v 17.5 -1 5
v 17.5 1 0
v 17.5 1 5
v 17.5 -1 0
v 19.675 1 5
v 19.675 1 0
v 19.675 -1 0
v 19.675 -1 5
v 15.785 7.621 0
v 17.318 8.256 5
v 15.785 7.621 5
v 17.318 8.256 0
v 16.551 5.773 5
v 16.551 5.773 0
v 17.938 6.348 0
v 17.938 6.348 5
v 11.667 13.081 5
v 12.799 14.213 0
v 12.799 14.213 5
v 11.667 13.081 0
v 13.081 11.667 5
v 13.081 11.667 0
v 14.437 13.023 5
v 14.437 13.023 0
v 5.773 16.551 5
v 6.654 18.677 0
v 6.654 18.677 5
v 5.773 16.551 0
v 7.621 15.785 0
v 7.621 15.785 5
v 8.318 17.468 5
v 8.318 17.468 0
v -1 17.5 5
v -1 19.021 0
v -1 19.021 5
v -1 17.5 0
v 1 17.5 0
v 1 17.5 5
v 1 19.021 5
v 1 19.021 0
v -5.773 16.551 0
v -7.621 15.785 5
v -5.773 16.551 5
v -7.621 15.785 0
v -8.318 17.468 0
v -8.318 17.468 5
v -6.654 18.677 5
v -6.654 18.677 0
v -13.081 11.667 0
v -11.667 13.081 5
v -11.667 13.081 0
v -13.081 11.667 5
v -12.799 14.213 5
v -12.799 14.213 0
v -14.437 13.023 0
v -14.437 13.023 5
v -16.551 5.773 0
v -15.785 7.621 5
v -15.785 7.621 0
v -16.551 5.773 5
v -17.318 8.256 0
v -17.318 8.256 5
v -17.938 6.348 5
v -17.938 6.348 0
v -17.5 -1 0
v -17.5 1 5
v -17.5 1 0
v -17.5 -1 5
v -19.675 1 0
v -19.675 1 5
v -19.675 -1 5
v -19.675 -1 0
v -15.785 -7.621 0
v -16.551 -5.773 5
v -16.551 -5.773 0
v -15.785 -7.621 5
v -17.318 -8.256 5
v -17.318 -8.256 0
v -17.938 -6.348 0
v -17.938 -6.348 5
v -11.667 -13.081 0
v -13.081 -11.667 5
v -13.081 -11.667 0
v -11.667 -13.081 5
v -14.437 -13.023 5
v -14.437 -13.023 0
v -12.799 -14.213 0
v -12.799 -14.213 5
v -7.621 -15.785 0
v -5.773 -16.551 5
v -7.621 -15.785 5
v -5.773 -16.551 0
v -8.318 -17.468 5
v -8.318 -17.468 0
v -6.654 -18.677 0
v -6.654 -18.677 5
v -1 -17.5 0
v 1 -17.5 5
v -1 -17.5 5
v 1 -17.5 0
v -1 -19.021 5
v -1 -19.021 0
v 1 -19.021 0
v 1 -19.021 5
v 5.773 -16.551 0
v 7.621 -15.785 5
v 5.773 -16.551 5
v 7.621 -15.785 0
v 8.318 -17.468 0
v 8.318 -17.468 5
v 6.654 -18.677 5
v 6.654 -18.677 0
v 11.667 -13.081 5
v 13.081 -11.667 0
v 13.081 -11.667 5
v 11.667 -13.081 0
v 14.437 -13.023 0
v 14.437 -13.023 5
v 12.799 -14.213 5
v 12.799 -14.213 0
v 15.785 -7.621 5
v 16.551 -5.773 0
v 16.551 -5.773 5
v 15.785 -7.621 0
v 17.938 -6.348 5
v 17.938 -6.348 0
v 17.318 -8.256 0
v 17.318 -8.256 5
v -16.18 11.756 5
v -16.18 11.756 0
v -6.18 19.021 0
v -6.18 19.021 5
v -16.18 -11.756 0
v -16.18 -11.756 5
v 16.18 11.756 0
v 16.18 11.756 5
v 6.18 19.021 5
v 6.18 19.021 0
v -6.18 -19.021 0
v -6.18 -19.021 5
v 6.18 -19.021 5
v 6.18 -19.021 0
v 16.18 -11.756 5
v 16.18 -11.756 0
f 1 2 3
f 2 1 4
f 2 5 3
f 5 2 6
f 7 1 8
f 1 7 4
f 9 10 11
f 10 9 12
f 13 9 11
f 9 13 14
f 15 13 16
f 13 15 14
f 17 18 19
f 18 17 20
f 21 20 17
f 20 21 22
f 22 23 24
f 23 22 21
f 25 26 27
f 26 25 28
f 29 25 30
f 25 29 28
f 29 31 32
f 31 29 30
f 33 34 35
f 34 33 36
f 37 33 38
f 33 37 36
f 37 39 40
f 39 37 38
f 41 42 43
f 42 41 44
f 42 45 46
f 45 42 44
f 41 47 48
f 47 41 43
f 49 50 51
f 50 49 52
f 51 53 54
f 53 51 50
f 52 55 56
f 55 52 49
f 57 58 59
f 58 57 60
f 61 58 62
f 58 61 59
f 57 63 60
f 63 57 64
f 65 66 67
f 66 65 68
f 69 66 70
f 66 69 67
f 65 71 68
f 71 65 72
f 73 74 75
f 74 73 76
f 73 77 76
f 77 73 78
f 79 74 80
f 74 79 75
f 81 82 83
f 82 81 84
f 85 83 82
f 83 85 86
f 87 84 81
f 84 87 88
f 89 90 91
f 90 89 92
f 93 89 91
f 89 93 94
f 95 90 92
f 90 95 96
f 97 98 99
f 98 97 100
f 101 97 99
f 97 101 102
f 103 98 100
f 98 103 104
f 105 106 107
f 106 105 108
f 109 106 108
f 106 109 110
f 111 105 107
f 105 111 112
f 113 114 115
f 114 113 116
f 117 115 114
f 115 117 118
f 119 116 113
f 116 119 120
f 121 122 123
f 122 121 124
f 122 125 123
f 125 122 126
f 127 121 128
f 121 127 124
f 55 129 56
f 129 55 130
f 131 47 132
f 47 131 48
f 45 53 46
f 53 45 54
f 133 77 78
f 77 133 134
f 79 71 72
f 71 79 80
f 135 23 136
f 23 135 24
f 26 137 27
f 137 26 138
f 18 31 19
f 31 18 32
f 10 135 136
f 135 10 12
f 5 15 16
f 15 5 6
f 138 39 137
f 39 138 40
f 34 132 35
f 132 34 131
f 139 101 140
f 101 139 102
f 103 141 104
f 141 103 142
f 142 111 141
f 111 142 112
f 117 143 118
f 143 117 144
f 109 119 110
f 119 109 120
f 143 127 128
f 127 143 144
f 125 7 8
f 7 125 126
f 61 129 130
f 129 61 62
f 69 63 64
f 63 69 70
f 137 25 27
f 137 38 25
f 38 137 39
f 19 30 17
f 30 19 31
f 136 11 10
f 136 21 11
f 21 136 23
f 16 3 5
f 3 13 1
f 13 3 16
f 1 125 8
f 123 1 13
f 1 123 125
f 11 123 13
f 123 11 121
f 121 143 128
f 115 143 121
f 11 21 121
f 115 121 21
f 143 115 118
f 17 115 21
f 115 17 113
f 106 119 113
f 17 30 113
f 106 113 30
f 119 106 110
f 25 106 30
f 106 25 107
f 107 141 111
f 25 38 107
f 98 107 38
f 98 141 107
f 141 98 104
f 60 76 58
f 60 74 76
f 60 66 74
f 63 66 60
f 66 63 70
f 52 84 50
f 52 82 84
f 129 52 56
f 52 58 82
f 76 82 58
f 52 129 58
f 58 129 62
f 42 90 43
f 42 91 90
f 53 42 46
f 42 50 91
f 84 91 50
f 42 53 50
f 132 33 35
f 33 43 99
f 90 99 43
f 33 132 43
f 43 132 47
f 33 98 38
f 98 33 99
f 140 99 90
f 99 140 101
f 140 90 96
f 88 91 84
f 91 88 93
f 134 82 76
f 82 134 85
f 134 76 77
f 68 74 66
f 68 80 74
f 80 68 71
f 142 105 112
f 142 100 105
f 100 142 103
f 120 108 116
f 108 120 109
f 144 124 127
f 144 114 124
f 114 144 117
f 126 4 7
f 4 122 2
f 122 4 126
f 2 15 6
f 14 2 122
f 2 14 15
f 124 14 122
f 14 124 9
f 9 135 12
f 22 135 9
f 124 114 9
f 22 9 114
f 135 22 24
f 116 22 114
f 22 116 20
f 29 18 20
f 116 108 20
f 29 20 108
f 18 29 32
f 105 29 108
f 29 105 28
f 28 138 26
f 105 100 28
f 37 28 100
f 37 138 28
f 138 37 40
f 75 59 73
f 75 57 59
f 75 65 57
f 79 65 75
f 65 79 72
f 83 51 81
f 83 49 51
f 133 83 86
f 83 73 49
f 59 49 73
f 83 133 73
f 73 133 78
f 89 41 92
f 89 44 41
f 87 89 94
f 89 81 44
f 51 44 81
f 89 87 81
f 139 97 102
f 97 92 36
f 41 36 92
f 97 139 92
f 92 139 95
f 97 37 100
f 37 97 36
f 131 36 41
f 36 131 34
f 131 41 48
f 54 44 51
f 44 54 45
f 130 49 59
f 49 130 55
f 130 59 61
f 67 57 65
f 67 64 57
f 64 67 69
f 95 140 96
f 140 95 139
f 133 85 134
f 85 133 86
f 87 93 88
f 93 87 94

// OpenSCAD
gear_radius = 20;
gear_thickness = 5;
tooth_depth = 2;
tooth_width = 6;
num_tooth = 16;

union() {
    difference() {
        cylinder(r = gear_radius, h = gear_thickness, $fn = 10);
        
        for (i = [0 : num_tooth - 1]) {
            rotate([0, 0, i * (360 / num_tooth)])
            translate([gear_radius, 0, gear_thickness / 2])
            rotate([0, 90, 0])
            cube([tooth_width, tooth_depth, gear_thickness], center = true);
        }
    }
}
